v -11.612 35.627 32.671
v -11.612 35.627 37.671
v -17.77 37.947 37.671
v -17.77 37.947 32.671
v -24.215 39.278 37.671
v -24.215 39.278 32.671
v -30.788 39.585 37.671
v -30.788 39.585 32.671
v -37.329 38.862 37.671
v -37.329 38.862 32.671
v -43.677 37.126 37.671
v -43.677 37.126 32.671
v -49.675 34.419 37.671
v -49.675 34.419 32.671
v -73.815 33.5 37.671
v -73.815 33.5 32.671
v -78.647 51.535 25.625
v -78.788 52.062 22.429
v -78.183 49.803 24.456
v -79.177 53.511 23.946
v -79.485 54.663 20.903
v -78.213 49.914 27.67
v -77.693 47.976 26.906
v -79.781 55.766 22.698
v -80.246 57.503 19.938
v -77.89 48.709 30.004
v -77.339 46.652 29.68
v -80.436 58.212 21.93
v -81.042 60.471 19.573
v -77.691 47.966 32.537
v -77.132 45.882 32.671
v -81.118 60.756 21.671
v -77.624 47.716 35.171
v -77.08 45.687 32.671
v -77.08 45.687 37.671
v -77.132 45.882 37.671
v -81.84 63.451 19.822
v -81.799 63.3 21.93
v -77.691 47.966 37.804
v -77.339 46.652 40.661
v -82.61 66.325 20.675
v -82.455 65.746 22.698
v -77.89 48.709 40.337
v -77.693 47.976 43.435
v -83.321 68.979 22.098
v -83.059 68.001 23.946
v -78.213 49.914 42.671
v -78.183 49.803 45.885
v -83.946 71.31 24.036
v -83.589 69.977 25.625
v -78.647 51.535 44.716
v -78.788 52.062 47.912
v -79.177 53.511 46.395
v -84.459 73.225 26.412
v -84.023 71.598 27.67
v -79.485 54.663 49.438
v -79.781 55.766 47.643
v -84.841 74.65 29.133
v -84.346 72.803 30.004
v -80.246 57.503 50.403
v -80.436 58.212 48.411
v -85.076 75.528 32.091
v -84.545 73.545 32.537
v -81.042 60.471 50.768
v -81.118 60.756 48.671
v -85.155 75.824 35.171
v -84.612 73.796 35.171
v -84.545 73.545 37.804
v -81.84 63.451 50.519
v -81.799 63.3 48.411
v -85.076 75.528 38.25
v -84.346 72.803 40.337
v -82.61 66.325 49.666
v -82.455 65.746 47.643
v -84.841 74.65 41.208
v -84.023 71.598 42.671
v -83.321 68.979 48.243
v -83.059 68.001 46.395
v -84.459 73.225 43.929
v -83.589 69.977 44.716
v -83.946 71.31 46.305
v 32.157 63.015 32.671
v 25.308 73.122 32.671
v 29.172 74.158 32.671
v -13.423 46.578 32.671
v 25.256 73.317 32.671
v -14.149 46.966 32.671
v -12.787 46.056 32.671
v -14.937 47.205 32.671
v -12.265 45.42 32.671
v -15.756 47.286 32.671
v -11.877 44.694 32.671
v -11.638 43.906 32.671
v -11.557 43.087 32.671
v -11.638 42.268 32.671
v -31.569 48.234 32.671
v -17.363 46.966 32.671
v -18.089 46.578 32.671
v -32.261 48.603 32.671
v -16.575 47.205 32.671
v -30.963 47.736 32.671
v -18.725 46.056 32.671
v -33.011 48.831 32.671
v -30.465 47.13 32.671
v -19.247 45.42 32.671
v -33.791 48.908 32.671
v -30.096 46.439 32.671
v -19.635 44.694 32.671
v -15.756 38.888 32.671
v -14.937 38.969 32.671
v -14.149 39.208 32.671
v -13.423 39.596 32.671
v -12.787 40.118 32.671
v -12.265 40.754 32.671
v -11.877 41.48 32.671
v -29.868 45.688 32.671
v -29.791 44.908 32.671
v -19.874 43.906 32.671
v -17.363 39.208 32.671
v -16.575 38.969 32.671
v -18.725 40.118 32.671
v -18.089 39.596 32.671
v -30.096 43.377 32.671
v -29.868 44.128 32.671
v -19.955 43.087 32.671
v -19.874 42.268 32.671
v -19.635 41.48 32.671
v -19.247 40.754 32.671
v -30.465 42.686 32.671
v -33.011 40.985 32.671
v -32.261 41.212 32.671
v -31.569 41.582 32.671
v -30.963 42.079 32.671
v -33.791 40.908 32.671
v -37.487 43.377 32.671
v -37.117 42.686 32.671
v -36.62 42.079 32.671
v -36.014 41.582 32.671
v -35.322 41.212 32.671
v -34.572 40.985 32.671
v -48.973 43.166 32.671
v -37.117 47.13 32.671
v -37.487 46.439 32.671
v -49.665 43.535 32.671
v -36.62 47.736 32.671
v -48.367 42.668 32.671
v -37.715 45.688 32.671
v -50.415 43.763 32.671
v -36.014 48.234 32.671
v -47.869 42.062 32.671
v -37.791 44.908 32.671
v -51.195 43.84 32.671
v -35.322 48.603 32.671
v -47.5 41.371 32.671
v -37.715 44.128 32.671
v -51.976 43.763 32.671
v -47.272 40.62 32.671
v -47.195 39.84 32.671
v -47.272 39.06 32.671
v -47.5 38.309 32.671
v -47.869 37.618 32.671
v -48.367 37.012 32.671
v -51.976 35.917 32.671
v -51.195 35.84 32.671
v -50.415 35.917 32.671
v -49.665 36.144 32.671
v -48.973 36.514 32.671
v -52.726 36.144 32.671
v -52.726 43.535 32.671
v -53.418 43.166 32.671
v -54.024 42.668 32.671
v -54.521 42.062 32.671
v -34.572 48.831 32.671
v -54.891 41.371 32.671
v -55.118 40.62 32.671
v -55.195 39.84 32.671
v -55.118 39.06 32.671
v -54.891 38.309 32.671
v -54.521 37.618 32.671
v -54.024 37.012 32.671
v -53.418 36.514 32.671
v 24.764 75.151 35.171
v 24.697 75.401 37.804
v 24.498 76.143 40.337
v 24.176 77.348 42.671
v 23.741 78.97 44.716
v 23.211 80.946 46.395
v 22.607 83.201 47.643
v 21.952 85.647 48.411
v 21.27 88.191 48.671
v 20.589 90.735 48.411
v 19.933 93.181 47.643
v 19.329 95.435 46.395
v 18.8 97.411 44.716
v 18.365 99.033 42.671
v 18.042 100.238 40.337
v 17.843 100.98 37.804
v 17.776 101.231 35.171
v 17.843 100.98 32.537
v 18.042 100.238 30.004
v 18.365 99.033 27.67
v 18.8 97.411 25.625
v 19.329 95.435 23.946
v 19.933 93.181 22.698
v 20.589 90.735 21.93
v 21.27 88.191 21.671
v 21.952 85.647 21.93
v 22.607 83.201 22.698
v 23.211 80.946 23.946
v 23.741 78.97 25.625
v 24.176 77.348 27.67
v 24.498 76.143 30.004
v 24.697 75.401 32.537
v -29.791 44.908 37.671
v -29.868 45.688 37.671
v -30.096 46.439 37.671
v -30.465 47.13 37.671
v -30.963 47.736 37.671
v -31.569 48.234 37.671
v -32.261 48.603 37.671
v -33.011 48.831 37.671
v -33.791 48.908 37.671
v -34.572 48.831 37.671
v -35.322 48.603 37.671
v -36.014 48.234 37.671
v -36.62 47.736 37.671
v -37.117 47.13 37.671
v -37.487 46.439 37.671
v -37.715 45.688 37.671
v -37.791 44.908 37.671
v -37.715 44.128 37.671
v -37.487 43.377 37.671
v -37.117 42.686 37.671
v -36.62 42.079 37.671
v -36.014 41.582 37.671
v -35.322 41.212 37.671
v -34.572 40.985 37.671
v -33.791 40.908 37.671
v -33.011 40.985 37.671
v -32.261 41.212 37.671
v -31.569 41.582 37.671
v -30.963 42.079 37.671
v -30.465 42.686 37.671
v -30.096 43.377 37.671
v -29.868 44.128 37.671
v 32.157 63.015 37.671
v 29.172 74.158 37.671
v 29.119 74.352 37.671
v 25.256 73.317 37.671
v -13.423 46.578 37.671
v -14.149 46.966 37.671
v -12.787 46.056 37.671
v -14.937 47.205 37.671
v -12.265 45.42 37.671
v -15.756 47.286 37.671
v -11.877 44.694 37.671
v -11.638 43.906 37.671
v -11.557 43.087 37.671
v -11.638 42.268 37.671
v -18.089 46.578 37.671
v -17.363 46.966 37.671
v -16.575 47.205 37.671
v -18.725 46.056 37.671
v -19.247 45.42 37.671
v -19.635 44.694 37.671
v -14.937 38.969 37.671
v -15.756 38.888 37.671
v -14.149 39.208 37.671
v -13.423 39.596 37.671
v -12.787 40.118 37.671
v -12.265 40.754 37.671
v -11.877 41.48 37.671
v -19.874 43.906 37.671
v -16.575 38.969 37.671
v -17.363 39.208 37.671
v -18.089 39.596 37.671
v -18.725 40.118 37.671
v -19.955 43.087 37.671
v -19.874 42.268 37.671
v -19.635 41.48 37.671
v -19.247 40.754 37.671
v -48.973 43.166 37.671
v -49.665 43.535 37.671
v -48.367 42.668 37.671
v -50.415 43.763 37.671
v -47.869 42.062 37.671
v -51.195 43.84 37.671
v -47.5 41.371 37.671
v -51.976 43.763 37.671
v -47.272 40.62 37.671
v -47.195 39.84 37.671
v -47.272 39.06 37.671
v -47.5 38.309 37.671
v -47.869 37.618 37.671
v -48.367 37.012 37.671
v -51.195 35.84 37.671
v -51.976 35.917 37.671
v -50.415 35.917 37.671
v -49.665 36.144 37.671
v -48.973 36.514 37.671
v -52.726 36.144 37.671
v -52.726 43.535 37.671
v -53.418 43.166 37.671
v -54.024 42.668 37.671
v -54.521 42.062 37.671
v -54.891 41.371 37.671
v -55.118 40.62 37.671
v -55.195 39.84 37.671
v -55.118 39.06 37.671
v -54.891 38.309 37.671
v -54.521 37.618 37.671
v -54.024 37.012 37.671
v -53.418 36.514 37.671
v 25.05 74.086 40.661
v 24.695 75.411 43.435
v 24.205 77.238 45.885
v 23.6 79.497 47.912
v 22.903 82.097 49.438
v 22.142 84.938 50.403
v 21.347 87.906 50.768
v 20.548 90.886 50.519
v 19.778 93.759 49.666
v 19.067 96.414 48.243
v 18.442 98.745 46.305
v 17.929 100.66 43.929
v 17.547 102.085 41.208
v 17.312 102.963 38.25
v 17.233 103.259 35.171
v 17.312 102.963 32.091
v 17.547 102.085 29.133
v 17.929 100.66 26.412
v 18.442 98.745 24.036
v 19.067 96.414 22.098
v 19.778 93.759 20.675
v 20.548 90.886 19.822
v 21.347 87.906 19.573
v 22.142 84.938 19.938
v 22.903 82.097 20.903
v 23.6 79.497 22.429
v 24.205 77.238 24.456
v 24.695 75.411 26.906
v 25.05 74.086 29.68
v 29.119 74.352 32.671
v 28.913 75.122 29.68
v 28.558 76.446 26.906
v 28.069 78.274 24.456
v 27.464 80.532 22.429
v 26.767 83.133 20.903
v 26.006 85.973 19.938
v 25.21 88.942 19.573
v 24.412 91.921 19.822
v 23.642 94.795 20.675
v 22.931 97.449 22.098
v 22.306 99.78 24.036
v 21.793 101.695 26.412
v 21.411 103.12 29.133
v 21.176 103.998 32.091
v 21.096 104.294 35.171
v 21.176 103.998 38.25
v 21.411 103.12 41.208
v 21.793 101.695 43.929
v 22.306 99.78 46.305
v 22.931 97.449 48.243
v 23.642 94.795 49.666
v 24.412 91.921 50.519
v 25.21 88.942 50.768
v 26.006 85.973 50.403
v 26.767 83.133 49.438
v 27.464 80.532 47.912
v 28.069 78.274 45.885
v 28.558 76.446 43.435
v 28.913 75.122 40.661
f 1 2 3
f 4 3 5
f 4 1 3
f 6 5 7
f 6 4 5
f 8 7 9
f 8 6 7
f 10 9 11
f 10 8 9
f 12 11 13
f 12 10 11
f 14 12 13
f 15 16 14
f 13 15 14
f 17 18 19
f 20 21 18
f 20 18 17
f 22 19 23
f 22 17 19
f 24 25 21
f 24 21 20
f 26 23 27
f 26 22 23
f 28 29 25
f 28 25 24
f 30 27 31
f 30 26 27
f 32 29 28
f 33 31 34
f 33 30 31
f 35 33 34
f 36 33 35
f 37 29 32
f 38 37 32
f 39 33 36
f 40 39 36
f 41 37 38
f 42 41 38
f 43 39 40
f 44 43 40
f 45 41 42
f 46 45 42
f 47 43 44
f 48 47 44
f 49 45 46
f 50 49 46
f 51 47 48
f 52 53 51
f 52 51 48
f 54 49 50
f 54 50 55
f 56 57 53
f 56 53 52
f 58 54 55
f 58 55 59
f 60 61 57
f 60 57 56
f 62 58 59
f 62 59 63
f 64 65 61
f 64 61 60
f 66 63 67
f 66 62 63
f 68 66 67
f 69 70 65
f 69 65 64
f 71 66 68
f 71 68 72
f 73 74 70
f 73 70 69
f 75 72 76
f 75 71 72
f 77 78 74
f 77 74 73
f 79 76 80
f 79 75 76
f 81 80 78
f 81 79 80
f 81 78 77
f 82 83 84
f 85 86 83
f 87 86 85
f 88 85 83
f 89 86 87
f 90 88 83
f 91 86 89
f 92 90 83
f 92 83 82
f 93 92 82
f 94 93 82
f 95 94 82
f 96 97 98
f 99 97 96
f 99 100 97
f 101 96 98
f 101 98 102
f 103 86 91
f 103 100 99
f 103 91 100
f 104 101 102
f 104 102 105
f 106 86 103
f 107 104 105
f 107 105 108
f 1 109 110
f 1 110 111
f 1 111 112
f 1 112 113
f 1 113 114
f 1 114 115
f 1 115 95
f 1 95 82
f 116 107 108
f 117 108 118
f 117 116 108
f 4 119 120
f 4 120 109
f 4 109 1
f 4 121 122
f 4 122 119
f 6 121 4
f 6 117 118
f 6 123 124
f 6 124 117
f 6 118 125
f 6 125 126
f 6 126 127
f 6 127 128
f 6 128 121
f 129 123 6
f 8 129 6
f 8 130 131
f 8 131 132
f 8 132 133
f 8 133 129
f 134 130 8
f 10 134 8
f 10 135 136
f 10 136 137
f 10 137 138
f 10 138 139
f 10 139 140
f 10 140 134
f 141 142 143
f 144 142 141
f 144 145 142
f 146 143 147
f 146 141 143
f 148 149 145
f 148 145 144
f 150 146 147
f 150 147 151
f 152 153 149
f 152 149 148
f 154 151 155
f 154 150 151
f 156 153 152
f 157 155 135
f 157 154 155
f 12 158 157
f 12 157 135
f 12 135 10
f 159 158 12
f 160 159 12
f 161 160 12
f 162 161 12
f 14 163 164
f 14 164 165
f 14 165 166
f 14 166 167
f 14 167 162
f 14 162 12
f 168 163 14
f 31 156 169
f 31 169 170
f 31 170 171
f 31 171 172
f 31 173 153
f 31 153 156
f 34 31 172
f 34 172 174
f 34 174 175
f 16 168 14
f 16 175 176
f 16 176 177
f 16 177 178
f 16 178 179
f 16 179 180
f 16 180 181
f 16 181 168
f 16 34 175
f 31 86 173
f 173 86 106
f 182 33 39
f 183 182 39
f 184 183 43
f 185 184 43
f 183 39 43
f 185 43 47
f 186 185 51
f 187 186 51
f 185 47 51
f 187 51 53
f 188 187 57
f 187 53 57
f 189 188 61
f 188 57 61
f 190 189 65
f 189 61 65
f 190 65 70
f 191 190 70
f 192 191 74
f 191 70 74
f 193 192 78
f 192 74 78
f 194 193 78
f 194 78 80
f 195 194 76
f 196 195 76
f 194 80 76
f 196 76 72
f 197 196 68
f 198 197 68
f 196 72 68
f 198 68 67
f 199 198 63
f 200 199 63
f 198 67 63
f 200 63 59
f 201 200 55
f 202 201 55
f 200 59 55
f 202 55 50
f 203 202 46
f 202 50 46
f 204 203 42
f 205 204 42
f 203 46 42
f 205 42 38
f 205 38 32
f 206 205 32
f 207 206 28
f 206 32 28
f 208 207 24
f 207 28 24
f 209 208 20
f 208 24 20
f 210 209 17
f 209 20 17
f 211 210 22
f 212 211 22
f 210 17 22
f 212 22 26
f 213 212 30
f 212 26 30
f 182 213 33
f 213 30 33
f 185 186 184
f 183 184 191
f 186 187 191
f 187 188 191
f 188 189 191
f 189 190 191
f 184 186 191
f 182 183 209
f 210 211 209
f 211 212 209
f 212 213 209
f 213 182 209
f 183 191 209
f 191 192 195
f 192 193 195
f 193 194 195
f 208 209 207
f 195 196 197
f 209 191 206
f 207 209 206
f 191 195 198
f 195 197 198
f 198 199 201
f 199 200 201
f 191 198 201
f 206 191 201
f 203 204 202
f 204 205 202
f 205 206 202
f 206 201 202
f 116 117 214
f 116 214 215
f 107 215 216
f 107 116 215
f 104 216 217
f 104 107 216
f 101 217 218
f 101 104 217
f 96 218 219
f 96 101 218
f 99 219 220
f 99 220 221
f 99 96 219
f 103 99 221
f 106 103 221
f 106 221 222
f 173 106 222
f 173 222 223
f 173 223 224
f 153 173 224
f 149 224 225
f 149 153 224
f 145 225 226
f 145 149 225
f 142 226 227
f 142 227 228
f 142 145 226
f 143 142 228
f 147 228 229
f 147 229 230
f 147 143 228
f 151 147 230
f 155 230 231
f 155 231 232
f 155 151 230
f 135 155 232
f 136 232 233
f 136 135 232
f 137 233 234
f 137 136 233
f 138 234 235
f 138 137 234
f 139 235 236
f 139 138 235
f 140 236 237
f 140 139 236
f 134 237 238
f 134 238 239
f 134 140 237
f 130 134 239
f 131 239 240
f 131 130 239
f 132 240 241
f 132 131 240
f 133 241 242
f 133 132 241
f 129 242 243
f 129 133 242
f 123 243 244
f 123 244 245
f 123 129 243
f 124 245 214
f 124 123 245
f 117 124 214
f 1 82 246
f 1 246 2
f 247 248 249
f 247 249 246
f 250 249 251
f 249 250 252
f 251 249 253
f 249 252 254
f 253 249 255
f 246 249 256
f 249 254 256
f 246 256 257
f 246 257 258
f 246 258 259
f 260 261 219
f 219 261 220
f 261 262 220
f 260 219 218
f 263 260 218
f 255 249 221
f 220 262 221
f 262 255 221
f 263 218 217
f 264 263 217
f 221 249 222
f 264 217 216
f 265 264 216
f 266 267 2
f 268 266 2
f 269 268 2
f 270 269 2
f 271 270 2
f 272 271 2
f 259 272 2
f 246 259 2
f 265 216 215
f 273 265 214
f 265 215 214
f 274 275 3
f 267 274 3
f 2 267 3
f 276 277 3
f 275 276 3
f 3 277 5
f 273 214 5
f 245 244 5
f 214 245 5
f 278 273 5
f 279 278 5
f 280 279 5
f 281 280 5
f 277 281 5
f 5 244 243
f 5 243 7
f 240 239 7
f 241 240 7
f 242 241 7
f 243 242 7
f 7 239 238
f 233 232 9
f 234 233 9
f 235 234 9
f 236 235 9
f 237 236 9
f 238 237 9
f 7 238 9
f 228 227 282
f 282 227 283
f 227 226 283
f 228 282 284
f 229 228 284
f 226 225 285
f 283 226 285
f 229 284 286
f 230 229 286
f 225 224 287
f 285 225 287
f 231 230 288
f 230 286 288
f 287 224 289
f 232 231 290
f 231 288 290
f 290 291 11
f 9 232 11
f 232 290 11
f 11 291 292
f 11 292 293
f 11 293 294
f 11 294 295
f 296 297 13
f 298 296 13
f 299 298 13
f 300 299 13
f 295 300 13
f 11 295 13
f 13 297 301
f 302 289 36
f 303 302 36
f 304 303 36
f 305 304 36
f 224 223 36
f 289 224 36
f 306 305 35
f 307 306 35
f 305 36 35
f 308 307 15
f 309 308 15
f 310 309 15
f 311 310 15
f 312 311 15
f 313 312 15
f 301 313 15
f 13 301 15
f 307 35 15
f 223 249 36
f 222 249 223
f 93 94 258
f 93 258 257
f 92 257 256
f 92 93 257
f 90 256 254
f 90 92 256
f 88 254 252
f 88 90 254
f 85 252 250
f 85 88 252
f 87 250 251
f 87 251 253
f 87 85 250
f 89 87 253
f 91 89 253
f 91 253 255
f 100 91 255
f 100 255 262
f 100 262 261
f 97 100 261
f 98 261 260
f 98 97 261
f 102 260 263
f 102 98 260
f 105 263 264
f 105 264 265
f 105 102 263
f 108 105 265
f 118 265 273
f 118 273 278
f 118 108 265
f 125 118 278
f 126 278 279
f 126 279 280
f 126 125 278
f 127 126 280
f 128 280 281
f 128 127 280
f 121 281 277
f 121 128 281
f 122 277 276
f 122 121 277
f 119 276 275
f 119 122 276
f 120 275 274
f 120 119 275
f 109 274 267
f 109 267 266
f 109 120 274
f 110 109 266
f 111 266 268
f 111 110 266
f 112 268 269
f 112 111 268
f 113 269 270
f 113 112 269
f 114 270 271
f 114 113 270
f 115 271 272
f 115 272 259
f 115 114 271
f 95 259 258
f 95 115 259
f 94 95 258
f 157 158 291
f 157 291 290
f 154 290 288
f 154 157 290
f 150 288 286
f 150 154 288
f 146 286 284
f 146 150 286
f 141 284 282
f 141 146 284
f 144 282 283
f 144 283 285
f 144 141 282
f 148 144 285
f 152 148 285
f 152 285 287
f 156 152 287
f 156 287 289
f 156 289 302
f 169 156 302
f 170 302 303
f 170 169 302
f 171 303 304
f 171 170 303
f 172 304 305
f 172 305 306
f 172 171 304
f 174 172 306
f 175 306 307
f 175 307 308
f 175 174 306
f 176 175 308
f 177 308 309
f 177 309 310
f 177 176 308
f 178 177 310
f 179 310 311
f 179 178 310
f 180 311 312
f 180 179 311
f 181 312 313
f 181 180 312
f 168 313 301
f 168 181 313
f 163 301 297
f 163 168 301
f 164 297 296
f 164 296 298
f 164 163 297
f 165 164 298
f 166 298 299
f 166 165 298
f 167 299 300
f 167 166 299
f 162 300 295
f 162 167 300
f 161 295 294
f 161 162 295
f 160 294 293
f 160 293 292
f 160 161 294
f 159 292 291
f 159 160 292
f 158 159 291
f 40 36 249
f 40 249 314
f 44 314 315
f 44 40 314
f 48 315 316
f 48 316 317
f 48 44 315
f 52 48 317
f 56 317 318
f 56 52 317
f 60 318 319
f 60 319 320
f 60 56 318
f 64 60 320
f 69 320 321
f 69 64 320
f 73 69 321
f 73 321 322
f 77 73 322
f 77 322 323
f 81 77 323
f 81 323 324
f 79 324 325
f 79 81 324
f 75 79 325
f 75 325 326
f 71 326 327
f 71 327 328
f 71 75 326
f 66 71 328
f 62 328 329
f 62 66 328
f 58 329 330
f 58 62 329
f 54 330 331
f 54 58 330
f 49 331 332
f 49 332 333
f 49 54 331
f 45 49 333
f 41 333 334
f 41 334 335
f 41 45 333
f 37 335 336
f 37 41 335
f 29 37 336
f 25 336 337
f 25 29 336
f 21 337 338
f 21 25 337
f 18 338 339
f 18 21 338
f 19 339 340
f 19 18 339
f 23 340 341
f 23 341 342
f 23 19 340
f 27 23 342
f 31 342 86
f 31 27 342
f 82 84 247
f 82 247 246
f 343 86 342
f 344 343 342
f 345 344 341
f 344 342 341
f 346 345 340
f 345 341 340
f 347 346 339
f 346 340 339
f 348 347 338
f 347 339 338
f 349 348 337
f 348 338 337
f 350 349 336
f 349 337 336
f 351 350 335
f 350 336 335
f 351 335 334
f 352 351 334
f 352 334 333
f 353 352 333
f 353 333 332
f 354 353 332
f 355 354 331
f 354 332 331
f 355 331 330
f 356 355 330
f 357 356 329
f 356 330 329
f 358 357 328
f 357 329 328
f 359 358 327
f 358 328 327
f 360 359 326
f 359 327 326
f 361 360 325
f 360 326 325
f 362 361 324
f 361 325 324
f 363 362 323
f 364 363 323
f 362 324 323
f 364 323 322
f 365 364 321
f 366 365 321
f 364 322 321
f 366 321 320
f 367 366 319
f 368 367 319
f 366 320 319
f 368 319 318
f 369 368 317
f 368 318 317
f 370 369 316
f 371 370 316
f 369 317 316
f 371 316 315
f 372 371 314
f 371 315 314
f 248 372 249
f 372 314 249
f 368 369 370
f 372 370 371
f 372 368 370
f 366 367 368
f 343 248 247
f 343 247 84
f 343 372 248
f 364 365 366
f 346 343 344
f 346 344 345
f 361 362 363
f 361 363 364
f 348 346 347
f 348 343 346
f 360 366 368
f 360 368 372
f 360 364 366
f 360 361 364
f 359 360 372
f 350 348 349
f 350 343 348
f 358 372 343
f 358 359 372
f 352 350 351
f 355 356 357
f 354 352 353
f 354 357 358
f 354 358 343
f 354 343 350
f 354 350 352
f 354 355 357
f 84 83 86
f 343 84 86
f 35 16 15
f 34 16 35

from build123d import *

# Parameters (mm, degrees)
SKETCH1_R           = 4
SKETCH1_R_2         = 4.198873956
BOSS_EXTRUDE1_DEPTH = 5
SKETCH2_R           = 13.5
BOSS_EXTRUDE2_DEPTH = 106
BOSS_EXTRUDE4_DEPTH = 4
CUT_EXTRUDE1_START  = -10
CUT_EXTRUDE1_DEPTH  = 10


with BuildPart() as part:
    # Sketch1 → Boss-Extrude1 (new body)
    with BuildSketch(Plane.XY.offset(32.670544835)):
        with BuildLine():
            Line((-70.496842865, 21.117824566), (-77.080259334, 45.687469315))
            Line((-77.080259334, 45.687469315), (29.171581558, 74.157564276))
            Line((29.171581558, 74.157564276), (32.157340999, 63.014558343))
            Line((32.157340999, 63.014558343), (-11.6122935, 35.626592223))
            ThreePointArc((-11.6122935, 35.626592223), (-40.615747818, 38.096615543), (-64.259394629, 21.117824566))
            Line((-64.259394629, 21.117824566), (-70.496842865, 21.117824566))
        make_face()
        with Locations((-65.433540443, 28.621355152)):
            Circle(SKETCH1_R, mode=Mode.SUBTRACT)
        with Locations((-51.195341682, 39.839935825)):
            Circle(SKETCH1_R, mode=Mode.SUBTRACT)
        with Locations((-33.791359384, 44.907899562)):
            Circle(SKETCH1_R, mode=Mode.SUBTRACT)
        with Locations((-15.756175362, 43.087187195)):
            Circle(SKETCH1_R_2, mode=Mode.SUBTRACT)
    extrude(amount=BOSS_EXTRUDE1_DEPTH)

    # Sketch2 → Boss-Extrude2 (add)
    with BuildSketch(Plane(origin=(-60.494993695, -16.209584707, 0), x_dir=(0, 0, 1), z_dir=(-0.9659258262890686, -0.2588190451025196, 0))):
        with BuildLine():
            Line((37.670544835, 64.080545666), (37.670544835, 64.282169128))
            ThreePointArc((37.670544835, 64.282169128), (35.170544835, 95.280545666), (32.670544835, 64.282169128))
            Line((32.670544835, 64.282169128), (32.670544835, 64.080545666))
            Line((32.670544835, 64.080545666), (37.670544835, 64.080545666))
        make_face()
        with Locations(Location((35.170544835, 79.680545666, 0), (0, 0, 270))):
            Circle(SKETCH2_R, mode=Mode.SUBTRACT)
    extrude(amount=-BOSS_EXTRUDE2_DEPTH)

    # Sketch3 → Boss-Extrude4 (add)
    with BuildSketch(Plane(origin=(41.893143892, 11.225234074, 0), x_dir=(0, 0, -1), z_dir=(0.9659258262890686, 0.2588190451025196, 0))):
        with BuildLine():
            Line((-37.670544835, 64.282169128), (-37.670544835, 64.080545666))
            Line((-37.670544835, 64.080545666), (-32.670544835, 64.080545666))
            Line((-32.670544835, 64.080545666), (-32.670544835, 64.282169128))
            ThreePointArc((-32.670544835, 64.282169128), (-35.170544835, 95.280545666), (-37.670544835, 64.282169128))
        make_face()
    extrude(amount=BOSS_EXTRUDE4_DEPTH)

    # Sketch4 → Cut-Extrude1 (cut)
    with BuildSketch(Plane.XY.offset(37.670544835).offset(CUT_EXTRUDE1_START)):
        with BuildLine():
            Line((-73.814643096, 33.500023595), (-49.675245154, 34.41948085))
            ThreePointArc((-49.675245154, 34.41948085), (-57.759852218, 28.637597873), (-64.259394629, 21.117824566))
            Line((-64.259394629, 21.117824566), (-70.496842865, 21.117824566))
            Line((-70.496842865, 21.117824566), (-73.814643096, 33.500023595))
        make_face()
    extrude(amount=CUT_EXTRUDE1_DEPTH, mode=Mode.SUBTRACT)


solid = part.part
